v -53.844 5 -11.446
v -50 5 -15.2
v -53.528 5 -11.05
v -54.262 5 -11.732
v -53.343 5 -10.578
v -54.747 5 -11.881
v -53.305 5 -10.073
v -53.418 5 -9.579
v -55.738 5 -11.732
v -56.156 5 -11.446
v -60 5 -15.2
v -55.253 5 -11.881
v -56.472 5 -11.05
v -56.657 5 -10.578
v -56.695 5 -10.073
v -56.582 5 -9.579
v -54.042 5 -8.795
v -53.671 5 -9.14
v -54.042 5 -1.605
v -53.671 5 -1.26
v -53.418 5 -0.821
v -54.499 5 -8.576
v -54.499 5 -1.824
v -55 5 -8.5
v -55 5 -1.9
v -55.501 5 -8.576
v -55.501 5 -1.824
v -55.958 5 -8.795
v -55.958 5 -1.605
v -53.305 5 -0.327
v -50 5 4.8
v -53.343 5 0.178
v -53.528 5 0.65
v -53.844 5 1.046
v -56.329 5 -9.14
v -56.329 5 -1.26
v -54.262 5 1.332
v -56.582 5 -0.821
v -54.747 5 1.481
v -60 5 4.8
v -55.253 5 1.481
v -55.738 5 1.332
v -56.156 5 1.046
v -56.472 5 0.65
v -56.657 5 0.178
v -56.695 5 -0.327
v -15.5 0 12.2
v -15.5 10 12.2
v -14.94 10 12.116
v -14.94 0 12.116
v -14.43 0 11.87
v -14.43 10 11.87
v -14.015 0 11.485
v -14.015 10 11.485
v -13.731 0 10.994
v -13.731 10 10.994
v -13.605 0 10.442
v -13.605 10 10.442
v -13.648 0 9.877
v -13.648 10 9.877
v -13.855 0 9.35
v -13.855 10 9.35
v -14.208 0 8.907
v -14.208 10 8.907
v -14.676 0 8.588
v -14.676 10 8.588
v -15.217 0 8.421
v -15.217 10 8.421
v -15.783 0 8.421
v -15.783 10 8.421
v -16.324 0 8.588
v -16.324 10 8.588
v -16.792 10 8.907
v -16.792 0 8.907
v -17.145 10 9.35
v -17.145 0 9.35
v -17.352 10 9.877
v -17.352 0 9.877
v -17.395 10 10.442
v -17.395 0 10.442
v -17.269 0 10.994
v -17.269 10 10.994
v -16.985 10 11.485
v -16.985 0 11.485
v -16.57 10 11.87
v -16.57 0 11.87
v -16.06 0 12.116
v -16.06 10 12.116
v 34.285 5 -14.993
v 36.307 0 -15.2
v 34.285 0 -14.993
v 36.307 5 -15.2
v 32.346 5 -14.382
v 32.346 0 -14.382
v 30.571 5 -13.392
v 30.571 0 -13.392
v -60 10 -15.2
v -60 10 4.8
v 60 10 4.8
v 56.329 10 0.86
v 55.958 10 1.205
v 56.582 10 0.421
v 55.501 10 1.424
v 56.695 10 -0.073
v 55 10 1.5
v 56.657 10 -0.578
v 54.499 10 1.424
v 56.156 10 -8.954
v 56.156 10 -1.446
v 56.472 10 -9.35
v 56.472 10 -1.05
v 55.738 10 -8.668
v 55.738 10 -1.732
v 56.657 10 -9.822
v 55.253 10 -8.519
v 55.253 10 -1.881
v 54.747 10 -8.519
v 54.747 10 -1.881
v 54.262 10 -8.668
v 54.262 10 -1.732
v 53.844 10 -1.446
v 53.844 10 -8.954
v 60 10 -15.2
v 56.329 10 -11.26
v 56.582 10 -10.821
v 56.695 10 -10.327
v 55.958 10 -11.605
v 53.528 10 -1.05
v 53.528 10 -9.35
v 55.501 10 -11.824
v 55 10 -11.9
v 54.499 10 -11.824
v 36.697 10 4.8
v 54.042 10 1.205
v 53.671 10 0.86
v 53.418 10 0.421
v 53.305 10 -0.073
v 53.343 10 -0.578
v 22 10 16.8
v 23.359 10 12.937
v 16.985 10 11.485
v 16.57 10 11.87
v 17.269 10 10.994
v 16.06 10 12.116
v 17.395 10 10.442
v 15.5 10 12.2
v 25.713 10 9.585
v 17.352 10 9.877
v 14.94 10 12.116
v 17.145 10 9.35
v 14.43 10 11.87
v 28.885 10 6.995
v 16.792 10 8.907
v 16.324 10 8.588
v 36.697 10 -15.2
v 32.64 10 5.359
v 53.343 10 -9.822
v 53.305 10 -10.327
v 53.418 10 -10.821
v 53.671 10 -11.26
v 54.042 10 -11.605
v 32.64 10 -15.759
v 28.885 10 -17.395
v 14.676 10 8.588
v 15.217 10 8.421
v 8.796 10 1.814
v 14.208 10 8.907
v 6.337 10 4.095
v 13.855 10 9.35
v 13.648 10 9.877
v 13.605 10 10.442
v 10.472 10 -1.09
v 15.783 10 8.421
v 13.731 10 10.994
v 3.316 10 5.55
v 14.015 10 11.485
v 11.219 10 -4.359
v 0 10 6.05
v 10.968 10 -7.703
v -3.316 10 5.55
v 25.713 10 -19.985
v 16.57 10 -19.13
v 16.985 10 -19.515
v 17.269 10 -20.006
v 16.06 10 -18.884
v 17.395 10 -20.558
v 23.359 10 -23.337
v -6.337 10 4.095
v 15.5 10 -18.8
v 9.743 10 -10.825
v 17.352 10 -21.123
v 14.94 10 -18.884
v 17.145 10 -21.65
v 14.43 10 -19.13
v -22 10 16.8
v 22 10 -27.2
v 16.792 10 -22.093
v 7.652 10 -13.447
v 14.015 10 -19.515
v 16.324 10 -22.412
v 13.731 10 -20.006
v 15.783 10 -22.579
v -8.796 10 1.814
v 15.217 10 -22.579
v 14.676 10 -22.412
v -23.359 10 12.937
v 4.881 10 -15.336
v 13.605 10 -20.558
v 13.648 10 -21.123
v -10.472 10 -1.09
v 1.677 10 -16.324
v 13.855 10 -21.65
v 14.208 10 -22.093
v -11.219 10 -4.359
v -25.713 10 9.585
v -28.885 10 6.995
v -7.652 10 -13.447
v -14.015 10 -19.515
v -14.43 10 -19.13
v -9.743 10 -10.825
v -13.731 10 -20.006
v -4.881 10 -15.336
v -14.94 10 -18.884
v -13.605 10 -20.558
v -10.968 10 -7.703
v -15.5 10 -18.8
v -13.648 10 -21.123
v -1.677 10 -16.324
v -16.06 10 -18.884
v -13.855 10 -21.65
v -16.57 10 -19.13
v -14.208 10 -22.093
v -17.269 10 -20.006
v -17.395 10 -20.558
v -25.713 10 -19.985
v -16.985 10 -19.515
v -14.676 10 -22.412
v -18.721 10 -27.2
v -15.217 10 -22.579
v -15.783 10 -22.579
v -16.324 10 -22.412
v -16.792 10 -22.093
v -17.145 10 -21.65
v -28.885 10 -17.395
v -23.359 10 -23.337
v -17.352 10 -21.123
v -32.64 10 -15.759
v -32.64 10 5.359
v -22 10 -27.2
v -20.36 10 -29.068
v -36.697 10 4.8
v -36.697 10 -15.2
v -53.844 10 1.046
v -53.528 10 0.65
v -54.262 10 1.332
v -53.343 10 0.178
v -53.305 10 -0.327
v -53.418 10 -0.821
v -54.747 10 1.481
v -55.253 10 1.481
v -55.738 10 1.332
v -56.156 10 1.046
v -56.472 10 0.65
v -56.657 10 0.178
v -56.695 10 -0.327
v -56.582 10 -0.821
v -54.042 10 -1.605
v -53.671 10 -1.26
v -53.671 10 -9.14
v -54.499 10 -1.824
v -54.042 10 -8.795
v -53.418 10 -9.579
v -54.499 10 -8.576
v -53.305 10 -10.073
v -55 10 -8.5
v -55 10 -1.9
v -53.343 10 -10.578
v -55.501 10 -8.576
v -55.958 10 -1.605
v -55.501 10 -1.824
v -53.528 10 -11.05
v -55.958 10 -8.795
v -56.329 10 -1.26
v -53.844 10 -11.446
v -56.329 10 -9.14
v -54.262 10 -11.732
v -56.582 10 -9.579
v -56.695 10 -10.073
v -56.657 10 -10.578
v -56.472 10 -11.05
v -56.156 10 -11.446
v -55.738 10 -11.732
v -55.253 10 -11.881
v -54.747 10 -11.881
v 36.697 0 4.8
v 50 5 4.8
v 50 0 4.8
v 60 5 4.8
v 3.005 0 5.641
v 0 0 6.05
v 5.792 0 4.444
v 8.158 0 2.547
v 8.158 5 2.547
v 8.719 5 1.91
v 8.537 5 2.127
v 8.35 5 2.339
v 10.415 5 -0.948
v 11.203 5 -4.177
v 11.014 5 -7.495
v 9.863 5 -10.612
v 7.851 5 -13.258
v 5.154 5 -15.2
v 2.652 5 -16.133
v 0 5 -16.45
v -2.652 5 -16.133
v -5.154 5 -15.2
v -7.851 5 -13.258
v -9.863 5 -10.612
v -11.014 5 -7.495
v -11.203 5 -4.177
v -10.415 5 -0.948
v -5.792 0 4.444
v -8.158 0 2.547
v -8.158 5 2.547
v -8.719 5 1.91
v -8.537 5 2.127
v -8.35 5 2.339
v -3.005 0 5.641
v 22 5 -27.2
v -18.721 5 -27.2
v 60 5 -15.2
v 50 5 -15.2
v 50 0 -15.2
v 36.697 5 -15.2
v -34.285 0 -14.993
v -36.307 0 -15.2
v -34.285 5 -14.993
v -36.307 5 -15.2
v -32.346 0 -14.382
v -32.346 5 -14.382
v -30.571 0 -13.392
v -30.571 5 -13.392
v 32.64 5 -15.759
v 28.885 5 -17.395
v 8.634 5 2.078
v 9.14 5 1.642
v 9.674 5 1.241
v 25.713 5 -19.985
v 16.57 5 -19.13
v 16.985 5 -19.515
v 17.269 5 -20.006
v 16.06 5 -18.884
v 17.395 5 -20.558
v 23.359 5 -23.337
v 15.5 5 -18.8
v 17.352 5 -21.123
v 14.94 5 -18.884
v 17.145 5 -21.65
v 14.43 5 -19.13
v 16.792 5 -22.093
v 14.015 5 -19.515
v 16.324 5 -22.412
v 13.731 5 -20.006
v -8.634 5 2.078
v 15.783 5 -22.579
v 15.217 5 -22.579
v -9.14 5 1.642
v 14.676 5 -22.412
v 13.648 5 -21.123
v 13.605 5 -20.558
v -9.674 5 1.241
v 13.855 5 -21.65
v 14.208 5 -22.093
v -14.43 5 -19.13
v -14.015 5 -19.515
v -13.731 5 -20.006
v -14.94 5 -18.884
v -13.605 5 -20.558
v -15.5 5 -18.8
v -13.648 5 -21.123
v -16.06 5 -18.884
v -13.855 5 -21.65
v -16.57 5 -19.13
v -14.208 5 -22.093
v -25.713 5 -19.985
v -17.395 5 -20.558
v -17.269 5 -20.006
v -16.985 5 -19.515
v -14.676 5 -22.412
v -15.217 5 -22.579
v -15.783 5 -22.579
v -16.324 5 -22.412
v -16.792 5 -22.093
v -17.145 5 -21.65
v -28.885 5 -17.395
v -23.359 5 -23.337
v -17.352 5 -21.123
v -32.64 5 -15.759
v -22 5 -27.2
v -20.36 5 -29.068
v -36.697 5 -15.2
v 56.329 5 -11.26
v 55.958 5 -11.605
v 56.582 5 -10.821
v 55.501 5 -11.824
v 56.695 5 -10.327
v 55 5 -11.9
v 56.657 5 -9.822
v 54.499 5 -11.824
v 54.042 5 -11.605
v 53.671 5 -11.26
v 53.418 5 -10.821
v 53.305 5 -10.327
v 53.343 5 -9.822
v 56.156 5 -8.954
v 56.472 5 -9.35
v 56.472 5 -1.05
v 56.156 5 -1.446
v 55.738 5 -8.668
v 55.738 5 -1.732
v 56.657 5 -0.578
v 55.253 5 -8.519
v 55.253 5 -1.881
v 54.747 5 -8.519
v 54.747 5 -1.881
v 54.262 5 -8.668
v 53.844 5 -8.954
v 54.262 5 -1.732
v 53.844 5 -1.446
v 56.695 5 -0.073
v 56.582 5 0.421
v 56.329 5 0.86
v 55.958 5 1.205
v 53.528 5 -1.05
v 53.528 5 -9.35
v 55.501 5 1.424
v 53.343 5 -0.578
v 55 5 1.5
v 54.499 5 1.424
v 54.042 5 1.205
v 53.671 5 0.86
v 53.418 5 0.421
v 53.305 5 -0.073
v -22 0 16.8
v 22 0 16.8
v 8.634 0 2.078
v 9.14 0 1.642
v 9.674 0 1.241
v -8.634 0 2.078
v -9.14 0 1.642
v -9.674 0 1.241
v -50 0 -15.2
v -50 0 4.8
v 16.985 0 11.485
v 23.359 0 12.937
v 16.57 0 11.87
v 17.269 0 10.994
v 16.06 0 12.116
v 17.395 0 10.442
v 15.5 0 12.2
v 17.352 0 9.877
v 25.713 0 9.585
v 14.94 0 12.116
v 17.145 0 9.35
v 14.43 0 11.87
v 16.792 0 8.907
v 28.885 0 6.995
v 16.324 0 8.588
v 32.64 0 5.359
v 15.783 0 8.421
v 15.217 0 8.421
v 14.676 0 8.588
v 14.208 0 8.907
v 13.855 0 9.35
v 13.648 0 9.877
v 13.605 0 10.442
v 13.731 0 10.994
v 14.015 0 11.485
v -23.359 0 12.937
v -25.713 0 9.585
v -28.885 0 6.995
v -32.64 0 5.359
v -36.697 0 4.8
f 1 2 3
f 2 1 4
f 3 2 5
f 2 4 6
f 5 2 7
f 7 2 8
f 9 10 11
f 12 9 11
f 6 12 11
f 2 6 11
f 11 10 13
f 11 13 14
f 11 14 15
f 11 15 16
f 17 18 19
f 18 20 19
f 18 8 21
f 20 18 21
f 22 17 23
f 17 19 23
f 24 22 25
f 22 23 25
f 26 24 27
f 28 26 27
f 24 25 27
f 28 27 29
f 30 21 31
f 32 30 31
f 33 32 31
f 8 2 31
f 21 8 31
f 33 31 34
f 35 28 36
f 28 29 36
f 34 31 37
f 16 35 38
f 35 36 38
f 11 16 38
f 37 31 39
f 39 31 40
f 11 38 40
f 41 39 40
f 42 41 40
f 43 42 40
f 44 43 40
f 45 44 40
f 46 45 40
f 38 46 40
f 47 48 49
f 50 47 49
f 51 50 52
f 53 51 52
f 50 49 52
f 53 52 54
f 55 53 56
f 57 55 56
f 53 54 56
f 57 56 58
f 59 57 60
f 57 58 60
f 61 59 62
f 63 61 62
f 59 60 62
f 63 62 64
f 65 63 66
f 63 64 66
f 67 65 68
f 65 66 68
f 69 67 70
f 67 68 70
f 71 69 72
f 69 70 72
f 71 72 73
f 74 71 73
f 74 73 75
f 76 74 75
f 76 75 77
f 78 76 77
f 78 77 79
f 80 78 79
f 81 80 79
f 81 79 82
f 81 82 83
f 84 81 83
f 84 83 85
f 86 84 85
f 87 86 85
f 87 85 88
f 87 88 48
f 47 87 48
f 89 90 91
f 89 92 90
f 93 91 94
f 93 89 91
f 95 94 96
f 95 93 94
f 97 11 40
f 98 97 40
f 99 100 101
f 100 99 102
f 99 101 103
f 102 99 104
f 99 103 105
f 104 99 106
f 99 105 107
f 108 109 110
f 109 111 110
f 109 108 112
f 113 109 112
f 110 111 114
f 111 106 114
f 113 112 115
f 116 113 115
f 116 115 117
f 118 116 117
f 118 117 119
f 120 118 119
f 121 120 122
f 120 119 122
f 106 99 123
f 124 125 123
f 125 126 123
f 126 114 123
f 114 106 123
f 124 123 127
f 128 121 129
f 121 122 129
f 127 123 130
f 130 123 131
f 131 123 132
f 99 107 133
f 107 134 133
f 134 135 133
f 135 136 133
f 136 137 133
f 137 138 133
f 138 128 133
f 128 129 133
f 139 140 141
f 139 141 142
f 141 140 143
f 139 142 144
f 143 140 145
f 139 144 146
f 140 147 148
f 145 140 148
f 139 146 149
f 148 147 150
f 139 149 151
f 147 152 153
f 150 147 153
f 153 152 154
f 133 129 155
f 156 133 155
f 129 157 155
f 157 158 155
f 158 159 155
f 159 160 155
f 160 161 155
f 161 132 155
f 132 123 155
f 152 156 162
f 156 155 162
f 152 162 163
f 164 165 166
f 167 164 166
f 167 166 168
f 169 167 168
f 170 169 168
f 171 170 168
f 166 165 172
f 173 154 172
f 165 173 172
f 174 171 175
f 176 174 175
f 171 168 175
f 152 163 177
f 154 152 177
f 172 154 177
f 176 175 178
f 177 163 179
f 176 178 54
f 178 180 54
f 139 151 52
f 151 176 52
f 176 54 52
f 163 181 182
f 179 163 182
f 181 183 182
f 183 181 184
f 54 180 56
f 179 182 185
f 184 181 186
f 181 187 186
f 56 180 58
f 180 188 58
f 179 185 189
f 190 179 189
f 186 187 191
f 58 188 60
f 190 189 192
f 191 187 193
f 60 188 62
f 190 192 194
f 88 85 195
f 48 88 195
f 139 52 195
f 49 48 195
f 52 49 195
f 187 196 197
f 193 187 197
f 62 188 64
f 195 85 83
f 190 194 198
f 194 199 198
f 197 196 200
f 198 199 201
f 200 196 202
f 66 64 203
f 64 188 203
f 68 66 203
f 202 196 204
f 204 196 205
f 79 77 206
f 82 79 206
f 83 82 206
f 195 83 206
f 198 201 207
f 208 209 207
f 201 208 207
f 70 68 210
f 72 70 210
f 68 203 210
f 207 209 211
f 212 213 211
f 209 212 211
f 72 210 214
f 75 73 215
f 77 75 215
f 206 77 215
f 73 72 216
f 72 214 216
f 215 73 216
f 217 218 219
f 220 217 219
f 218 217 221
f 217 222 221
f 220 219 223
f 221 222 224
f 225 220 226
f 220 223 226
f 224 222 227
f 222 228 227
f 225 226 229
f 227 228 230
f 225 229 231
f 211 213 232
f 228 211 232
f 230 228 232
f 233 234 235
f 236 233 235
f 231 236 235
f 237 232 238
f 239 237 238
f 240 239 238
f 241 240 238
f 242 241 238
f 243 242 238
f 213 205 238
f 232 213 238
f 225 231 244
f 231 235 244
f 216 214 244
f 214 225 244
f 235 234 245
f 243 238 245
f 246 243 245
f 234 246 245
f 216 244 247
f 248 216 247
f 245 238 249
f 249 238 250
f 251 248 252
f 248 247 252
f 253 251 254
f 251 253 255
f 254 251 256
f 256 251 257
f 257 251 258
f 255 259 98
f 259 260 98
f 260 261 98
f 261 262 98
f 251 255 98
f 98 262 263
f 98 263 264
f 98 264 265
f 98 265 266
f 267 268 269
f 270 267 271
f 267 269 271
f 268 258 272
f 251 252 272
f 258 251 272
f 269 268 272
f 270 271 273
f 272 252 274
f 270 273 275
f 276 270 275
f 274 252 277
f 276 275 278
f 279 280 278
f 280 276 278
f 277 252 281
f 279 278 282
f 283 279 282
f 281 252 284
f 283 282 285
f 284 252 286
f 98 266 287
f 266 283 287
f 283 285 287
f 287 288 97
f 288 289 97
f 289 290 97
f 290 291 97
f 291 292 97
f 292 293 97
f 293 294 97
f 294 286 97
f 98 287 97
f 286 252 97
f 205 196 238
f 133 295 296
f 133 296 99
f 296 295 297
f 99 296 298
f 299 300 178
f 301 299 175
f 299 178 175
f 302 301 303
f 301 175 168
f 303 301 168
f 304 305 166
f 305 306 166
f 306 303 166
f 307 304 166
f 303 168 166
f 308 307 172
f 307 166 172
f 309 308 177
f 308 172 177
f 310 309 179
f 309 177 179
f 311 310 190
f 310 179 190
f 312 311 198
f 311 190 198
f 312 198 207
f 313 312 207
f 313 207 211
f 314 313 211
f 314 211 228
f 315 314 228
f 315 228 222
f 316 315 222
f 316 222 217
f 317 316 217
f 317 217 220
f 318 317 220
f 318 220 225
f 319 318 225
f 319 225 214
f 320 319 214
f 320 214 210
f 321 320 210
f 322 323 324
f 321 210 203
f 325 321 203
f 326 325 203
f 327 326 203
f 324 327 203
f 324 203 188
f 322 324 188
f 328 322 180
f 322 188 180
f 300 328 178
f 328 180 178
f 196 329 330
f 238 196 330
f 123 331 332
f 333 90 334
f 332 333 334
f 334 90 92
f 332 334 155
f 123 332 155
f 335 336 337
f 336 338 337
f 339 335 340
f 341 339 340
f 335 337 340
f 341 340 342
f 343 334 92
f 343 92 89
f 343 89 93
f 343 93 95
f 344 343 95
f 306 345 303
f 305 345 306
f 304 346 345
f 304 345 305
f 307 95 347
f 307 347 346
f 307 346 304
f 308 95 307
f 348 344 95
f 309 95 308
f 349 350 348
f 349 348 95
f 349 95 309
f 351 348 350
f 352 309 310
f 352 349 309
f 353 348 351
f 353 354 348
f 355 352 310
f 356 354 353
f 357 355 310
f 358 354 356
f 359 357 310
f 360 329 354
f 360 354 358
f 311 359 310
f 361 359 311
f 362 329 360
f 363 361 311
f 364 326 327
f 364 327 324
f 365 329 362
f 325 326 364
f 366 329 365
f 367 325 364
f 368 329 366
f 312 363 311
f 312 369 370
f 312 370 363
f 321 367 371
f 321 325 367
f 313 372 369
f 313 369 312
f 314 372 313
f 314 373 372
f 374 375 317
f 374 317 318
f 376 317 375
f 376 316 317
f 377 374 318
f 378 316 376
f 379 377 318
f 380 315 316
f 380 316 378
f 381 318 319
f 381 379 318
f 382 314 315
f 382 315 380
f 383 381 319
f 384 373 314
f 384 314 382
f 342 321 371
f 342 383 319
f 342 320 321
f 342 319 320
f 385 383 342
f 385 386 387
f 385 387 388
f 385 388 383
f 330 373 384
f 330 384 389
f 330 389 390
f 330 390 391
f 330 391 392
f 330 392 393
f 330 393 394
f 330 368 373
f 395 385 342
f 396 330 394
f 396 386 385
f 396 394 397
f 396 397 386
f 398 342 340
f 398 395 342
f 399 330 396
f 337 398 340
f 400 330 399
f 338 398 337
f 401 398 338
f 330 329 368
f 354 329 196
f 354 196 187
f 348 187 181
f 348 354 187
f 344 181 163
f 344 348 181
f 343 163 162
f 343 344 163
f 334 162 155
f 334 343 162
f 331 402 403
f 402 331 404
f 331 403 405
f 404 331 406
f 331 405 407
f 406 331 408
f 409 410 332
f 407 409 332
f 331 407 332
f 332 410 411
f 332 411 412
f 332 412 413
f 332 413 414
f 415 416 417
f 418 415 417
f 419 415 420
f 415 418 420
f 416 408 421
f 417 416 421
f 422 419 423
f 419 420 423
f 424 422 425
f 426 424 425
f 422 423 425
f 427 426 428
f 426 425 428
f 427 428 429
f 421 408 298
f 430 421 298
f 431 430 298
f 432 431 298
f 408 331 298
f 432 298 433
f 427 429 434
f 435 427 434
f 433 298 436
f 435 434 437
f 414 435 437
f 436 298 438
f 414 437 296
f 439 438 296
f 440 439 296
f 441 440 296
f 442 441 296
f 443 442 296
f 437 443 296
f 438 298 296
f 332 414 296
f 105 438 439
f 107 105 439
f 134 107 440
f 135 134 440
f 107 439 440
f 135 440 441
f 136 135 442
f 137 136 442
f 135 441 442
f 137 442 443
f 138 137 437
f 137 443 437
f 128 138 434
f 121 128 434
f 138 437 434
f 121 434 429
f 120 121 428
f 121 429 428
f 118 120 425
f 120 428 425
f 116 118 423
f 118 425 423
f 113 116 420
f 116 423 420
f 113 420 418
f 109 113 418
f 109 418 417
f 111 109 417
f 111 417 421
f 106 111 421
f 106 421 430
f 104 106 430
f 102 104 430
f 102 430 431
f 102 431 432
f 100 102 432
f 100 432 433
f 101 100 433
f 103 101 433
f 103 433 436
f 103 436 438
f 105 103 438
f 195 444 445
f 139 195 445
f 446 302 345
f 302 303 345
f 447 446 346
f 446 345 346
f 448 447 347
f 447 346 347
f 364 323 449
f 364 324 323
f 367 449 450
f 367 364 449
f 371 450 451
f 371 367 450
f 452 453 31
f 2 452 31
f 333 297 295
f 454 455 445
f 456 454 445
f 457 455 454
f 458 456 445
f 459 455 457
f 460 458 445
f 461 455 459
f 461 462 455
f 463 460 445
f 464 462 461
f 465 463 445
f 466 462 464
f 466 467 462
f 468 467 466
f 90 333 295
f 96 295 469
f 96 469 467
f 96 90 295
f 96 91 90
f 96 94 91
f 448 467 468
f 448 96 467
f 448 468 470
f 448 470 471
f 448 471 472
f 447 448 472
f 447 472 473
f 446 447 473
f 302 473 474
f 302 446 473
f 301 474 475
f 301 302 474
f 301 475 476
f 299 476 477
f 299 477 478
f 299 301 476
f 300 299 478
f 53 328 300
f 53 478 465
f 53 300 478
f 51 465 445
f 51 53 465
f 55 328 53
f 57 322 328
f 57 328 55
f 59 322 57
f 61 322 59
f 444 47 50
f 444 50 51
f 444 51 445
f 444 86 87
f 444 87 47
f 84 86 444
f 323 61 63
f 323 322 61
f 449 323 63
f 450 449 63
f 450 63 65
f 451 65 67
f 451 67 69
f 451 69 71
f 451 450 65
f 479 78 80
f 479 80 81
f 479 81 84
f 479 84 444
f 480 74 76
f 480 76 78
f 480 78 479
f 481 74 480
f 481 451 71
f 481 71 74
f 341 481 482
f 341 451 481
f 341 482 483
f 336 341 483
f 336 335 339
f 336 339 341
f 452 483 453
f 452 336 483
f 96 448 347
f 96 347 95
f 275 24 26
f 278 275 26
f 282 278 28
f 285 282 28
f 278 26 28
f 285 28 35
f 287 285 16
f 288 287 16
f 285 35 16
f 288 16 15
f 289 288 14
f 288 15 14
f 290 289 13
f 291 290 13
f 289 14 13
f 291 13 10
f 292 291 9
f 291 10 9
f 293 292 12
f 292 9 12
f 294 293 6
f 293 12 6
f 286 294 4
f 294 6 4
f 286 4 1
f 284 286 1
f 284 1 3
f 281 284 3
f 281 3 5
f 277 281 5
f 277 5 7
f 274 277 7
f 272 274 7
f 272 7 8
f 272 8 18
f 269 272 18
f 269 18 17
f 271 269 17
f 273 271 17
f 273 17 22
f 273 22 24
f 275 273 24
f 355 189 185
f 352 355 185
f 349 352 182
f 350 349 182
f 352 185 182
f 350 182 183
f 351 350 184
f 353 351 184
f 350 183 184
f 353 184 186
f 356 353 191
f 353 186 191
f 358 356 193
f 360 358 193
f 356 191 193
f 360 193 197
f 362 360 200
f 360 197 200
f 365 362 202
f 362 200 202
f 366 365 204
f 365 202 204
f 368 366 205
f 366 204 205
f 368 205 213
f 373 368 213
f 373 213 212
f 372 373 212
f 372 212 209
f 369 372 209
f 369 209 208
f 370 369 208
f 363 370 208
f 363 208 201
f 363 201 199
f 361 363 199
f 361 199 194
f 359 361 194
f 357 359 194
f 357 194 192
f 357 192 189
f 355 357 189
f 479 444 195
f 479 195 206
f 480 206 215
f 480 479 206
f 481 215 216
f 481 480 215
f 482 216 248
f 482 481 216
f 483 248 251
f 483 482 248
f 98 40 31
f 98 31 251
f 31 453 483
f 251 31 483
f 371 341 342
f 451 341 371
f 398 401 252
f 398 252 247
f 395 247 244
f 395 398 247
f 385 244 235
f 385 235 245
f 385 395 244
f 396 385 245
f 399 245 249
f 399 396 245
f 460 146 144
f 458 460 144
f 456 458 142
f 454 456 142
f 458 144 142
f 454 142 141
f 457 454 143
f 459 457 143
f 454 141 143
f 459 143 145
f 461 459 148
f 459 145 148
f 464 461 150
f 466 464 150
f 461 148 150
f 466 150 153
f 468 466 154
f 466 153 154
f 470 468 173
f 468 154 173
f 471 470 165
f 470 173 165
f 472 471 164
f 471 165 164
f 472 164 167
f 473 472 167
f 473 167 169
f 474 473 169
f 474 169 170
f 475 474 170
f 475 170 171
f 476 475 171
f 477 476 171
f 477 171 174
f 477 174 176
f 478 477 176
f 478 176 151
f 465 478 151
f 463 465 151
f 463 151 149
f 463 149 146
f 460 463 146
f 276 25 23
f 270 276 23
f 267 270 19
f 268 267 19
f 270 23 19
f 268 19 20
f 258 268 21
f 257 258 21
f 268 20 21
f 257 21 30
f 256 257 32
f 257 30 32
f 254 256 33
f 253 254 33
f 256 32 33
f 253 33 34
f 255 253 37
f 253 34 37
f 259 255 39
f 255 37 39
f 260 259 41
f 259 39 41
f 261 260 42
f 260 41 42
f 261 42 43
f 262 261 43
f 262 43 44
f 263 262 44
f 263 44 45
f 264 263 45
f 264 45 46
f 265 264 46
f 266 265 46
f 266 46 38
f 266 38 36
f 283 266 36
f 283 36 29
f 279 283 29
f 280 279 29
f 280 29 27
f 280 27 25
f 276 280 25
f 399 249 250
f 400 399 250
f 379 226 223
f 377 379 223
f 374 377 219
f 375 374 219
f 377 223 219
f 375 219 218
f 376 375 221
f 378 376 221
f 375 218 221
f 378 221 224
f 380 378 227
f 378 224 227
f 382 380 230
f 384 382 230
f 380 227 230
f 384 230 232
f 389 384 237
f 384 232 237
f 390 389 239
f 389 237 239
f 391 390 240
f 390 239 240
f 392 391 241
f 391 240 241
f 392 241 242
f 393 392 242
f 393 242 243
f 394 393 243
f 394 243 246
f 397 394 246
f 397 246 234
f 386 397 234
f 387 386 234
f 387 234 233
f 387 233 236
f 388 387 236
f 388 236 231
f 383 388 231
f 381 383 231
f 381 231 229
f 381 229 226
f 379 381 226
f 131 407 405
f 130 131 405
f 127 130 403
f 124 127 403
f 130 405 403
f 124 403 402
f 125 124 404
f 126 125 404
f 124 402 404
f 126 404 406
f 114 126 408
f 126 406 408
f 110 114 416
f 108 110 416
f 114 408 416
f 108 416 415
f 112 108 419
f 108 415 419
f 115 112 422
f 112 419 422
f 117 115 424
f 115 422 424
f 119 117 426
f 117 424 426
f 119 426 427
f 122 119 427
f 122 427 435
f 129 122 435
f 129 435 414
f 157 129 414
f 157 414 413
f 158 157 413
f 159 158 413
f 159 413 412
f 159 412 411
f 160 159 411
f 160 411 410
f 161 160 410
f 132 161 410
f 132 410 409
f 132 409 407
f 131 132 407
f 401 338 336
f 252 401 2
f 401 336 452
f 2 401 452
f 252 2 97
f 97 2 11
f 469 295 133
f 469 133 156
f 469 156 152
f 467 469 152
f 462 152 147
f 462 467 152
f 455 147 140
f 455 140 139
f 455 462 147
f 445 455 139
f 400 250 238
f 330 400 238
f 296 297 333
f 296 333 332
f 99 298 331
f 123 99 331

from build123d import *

# Parameters (mm, degrees)
AUFSATZ_LINEAR_AUSTRAGEN1_DEPTH      = 10
SKIZZE6_R                            = 1.9
SKIZZE6_R_2                          = 11.25
SCHNITT_LINEAR_AUSTRAGEN4_DEPTH      = 67.632124385
SKIZZE7_W                            = 20.880821379
SKIZZE7_H                            = 5
SCHNITT_LINEAR_AUSTRAGEN5_DEPTH      = 87.970339772
VERRUNDUNG3_R                        = 15
SCHNITT_LINEAR_AUSTRAGEN6_DEPTH      = 69.73136111
SCHNITT_LINEAR_AUSTRAGEN6_DEPTH_BACK = 69.73136111
SKIZZE8_W                            = 10
SKIZZE8_H                            = 5
SKIZZE9_R                            = 1.7
SCHNITT_LINEAR_AUSTRAGEN7_DEPTH      = 10
AUFSATZ_LINEAR_AUSTRAGEN2_DEPTH      = 5
FASE1_DEPTH                          = 5
VERRUNDUNG6_R                        = 10


with BuildPart() as part:
    # Skizze1 → Aufsatz-Linear austragen1 (new body)
    with BuildSketch(Plane(origin=(0, 0, 0), x_dir=(1, 0, 0), z_dir=(0, 1, 0))):
        Polygon((-60, -4.8), (-22, -4.8), (-22, -16.8), (22, -16.8), (22, -4.8), (60, -4.8), (60, 15.2), (22, 15.2), (22, 27.2), (0, 27.2), (-22, 27.2), (-22, 15.2), (-60, 15.2), align=None)
    extrude(amount=AUFSATZ_LINEAR_AUSTRAGEN1_DEPTH)

    # Skizze6 → Schnitt-Linear austragen4 (cut, through all)
    with BuildSketch(Plane(origin=(0, 10, 0), x_dir=(1, 0, 0), z_dir=(0, 1, 0))):
        with Locations(Location((15.5, 20.7, 0), (0, 0, 270))):
            Circle(SKIZZE6_R)
        with Locations(Location((15.5, -10.3, 0), (0, 0, 270))):
            Circle(SKIZZE6_R)
        with Locations(Location((-15.5, -10.3, 0), (0, 0, 270))):
            Circle(SKIZZE6_R)
        with Locations(Location((-15.5, 20.7, 0), (0, 0, 270))):
            Circle(SKIZZE6_R)
        with Locations(Location((0, 5.2, 0), (0, 0, 270))):
            Circle(SKIZZE6_R_2)
    extrude(amount=-SCHNITT_LINEAR_AUSTRAGEN4_DEPTH, mode=Mode.SUBTRACT)

    # Skizze7 → Schnitt-Linear austragen5 (cut, through all)
    with BuildSketch(Plane.ZY.offset(22)):
        with Locations((-25.64041069, 2.5)):
            Rectangle(SKIZZE7_W, SKIZZE7_H)
    extrude(amount=-SCHNITT_LINEAR_AUSTRAGEN5_DEPTH, mode=Mode.SUBTRACT)

    # Verrundung3
    # the kernel refuses this fillet: 15 mm, written as the material it adds along each edge
    with BuildSketch(Plane(origin=(-22, 5, -15.2), x_dir=(0, 0, -1), z_dir=(0, 1, 0))) as verrundung3_piece_1:
        with BuildLine():
            CenterArc((15, 14.696938457), VERRUNDUNG3_R, 180, 78.463040967)
            Line((0, 14.696938457), (-0.3, 14.696938457))
            Line((-0.3, 14.696938457), (-0.3, 0))
            Line((-0.3, 0), (0, -0.3))
            ThreePointArc((0, -0.3), (6, -0.3), (11.94, -0.293938769))
            Line((11.94, -0.293938769), (12, 0))
        make_face()
    extrude(amount=5)
    with BuildSketch(Plane(origin=(-22, 0, 4.8), x_dir=(-1, 0, 0), z_dir=(0, 1, 0))) as verrundung3_piece_2:
        with BuildLine():
            CenterArc((14.696938457, 15), VERRUNDUNG3_R, 191.536959033, 78.463040967)
            Line((0, 12), (-0.293938769, 11.94))
            ThreePointArc((-0.293938769, 11.94), (-0.3, 6), (-0.3, 0))
            Line((-0.3, 0), (0, -0.3))
            Line((0, -0.3), (14.696938457, -0.3))
            Line((14.696938457, -0.3), (14.696938457, 0))
        make_face()
    extrude(amount=10)
    with BuildSketch(Plane(origin=(22, 0, 4.8), x_dir=(1, 0, 0), z_dir=(0, 1, 0))) as verrundung3_piece_3:
        with BuildLine():
            CenterArc((14.696938457, -15), VERRUNDUNG3_R, 90, 78.463040967)
            Line((0, -12), (-0.293938769, -11.94))
            ThreePointArc((-0.293938769, -11.94), (-0.3, -6), (-0.3, 0))
            Line((-0.3, 0), (0, 0.3))
            Line((0, 0.3), (14.696938457, 0.3))
            Line((14.696938457, 0.3), (14.696938457, 0))
        make_face()
    extrude(amount=10)
    with BuildSketch(Plane(origin=(22, 5, -15.2), x_dir=(1, 0, 0), z_dir=(0, 1, 0))) as verrundung3_piece_4:
        with BuildLine():
            CenterArc((14.696938457, 15), VERRUNDUNG3_R, 191.536959033, 78.463040967)
            Line((0, 12), (-0.293938769, 11.94))
            ThreePointArc((-0.293938769, 11.94), (-0.3, 6), (-0.3, 0))
            Line((-0.3, 0), (0, -0.3))
            Line((0, -0.3), (14.696938457, -0.3))
            Line((14.696938457, -0.3), (14.696938457, 0))
        make_face()
    extrude(amount=5)

    # Skizze8 → Schnitt-Linear austragen6 (cut, two sides: drawn at the far end of the back side and taken through both)
    with BuildSketch(Plane(origin=(0, 0, -15.2), x_dir=(-1, 0, 0), z_dir=(0, 0, -1)).offset(-SCHNITT_LINEAR_AUSTRAGEN6_DEPTH_BACK)):
        with Locations((-55, 2.5)):
            Rectangle(SKIZZE8_W, SKIZZE8_H)
        with Locations((55, 2.5)):
            Rectangle(SKIZZE8_W, SKIZZE8_H)
    extrude(amount=SCHNITT_LINEAR_AUSTRAGEN6_DEPTH + SCHNITT_LINEAR_AUSTRAGEN6_DEPTH_BACK, mode=Mode.SUBTRACT)

    # Skizze9 → Schnitt-Linear austragen7 (cut)
    with BuildSketch(Plane.XZ.offset(-5)):
        with Locations(Location((-55, -0.2, 0), (0, 0, 270))):
            Circle(SKIZZE9_R)
        with Locations(Location((-55, -10.2, 0), (0, 0, 90))):
            Circle(SKIZZE9_R)
        with Locations(Location((55, -10.2, 0), (0, 0, 270))):
            Circle(SKIZZE9_R)
        with Locations(Location((55, -0.2, 0), (0, 0, 90))):
            Circle(SKIZZE9_R)
    extrude(amount=-SCHNITT_LINEAR_AUSTRAGEN7_DEPTH, mode=Mode.SUBTRACT)

    # Skizze10 → Aufsatz-Linear austragen2 (add)
    with BuildSketch(Plane(origin=(0, 10, 0), x_dir=(1, 0, 0), z_dir=(0, 1, 0))):
        Polygon((-22, 27.2), (-20.360366379, 29.068218634), (-18.720732758, 27.2), align=None)
    extrude(amount=-AUFSATZ_LINEAR_AUSTRAGEN2_DEPTH)

    # Fase1: read off the stored shape, not the designer's step
    # Fase1 outline → Fase1 (cut)
    with BuildSketch(Plane(origin=(0, 0, 0), x_dir=(1, 0, 0), z_dir=(0, 1, 0))):
        with BuildLine():
            Line((-5.153882032, 15.2), (-33.153882032, 15.2))
            Line((-33.153882032, 15.2), (-8.71856035, -1.90979644))
            ThreePointArc((-8.71856035, -1.90979644), (-11.013512063, 7.494570119), (-5.153882032, 15.2))
        make_face()
        with BuildLine():
            ThreePointArc((5.153882032, 15.2), (11.013512063, 7.494570119), (8.71856035, -1.90979644))
            Line((8.71856035, -1.90979644), (33.153882032, 15.2))
            Line((33.153882032, 15.2), (5.153882032, 15.2))
        make_face()
    extrude(amount=FASE1_DEPTH, mode=Mode.SUBTRACT)

    # Verrundung6
    verrundung6_edges = [part.edges().sort_by_distance(p)[0] for p in [
        (8.71856035, 2.5, 1.90979644),
        (-8.71856035, 2.5, 1.90979644),
        (-33.153882032, 2.5, -15.2),
        (33.153882032, 2.5, -15.2),
    ]]
    fillet(verrundung6_edges, radius=VERRUNDUNG6_R)


solid = part.part
